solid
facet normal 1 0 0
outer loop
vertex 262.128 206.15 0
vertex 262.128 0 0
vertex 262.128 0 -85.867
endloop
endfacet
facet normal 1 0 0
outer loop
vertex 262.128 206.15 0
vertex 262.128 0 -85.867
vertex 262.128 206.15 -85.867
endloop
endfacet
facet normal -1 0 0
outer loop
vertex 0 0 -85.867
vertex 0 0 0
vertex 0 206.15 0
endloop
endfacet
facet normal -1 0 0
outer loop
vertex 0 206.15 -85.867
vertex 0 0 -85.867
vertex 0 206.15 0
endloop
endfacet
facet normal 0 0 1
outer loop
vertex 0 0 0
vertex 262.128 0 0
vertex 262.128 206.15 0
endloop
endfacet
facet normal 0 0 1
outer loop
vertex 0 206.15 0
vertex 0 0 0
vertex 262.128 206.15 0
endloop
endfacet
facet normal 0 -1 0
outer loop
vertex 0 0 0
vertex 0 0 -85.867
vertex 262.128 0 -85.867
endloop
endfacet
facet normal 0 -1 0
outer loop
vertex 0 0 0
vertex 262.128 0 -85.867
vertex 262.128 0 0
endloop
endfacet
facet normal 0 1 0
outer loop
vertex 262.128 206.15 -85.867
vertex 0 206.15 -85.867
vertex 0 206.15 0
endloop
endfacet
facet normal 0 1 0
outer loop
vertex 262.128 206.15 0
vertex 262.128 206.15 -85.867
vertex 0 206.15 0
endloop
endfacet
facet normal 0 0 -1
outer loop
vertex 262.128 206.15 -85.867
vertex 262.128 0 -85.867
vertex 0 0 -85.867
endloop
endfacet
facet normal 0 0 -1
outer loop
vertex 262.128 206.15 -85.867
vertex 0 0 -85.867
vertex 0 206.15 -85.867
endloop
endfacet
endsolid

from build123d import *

# Parameters (mm, degrees)
F0_W     = 206.150278
F0_H     = 85.867301
F1_DEPTH = 262.128
F2_W     = 221.906885
F2_H     = 170.495471
F3_DEPTH = 15.24
F4_W     = 229.3874
F4_H     = 177.979987
F5_DEPTH = 40.386


with BuildPart() as f1:
    # F0 (on Right) → F1 (new body)
    with BuildSketch(Plane.YZ):
        with Locations((103.075139, -42.93365)):
            Rectangle(F0_W, F0_H)
    extrude(amount=F1_DEPTH)

    # F2 (on face) → F3 (join)
    with BuildSketch(Plane.XY):
        with Locations((131.61292, 103.582059)):
            Rectangle(F2_W, F2_H)
    extrude(amount=-F3_DEPTH)

    # F4 (on face) → F5 (join)
    with BuildSketch(Plane.XY):
        with Locations((130.545692, 104.651281)):
            Rectangle(F4_W, F4_H)
    extrude(amount=-F5_DEPTH)


solid = f1.part
